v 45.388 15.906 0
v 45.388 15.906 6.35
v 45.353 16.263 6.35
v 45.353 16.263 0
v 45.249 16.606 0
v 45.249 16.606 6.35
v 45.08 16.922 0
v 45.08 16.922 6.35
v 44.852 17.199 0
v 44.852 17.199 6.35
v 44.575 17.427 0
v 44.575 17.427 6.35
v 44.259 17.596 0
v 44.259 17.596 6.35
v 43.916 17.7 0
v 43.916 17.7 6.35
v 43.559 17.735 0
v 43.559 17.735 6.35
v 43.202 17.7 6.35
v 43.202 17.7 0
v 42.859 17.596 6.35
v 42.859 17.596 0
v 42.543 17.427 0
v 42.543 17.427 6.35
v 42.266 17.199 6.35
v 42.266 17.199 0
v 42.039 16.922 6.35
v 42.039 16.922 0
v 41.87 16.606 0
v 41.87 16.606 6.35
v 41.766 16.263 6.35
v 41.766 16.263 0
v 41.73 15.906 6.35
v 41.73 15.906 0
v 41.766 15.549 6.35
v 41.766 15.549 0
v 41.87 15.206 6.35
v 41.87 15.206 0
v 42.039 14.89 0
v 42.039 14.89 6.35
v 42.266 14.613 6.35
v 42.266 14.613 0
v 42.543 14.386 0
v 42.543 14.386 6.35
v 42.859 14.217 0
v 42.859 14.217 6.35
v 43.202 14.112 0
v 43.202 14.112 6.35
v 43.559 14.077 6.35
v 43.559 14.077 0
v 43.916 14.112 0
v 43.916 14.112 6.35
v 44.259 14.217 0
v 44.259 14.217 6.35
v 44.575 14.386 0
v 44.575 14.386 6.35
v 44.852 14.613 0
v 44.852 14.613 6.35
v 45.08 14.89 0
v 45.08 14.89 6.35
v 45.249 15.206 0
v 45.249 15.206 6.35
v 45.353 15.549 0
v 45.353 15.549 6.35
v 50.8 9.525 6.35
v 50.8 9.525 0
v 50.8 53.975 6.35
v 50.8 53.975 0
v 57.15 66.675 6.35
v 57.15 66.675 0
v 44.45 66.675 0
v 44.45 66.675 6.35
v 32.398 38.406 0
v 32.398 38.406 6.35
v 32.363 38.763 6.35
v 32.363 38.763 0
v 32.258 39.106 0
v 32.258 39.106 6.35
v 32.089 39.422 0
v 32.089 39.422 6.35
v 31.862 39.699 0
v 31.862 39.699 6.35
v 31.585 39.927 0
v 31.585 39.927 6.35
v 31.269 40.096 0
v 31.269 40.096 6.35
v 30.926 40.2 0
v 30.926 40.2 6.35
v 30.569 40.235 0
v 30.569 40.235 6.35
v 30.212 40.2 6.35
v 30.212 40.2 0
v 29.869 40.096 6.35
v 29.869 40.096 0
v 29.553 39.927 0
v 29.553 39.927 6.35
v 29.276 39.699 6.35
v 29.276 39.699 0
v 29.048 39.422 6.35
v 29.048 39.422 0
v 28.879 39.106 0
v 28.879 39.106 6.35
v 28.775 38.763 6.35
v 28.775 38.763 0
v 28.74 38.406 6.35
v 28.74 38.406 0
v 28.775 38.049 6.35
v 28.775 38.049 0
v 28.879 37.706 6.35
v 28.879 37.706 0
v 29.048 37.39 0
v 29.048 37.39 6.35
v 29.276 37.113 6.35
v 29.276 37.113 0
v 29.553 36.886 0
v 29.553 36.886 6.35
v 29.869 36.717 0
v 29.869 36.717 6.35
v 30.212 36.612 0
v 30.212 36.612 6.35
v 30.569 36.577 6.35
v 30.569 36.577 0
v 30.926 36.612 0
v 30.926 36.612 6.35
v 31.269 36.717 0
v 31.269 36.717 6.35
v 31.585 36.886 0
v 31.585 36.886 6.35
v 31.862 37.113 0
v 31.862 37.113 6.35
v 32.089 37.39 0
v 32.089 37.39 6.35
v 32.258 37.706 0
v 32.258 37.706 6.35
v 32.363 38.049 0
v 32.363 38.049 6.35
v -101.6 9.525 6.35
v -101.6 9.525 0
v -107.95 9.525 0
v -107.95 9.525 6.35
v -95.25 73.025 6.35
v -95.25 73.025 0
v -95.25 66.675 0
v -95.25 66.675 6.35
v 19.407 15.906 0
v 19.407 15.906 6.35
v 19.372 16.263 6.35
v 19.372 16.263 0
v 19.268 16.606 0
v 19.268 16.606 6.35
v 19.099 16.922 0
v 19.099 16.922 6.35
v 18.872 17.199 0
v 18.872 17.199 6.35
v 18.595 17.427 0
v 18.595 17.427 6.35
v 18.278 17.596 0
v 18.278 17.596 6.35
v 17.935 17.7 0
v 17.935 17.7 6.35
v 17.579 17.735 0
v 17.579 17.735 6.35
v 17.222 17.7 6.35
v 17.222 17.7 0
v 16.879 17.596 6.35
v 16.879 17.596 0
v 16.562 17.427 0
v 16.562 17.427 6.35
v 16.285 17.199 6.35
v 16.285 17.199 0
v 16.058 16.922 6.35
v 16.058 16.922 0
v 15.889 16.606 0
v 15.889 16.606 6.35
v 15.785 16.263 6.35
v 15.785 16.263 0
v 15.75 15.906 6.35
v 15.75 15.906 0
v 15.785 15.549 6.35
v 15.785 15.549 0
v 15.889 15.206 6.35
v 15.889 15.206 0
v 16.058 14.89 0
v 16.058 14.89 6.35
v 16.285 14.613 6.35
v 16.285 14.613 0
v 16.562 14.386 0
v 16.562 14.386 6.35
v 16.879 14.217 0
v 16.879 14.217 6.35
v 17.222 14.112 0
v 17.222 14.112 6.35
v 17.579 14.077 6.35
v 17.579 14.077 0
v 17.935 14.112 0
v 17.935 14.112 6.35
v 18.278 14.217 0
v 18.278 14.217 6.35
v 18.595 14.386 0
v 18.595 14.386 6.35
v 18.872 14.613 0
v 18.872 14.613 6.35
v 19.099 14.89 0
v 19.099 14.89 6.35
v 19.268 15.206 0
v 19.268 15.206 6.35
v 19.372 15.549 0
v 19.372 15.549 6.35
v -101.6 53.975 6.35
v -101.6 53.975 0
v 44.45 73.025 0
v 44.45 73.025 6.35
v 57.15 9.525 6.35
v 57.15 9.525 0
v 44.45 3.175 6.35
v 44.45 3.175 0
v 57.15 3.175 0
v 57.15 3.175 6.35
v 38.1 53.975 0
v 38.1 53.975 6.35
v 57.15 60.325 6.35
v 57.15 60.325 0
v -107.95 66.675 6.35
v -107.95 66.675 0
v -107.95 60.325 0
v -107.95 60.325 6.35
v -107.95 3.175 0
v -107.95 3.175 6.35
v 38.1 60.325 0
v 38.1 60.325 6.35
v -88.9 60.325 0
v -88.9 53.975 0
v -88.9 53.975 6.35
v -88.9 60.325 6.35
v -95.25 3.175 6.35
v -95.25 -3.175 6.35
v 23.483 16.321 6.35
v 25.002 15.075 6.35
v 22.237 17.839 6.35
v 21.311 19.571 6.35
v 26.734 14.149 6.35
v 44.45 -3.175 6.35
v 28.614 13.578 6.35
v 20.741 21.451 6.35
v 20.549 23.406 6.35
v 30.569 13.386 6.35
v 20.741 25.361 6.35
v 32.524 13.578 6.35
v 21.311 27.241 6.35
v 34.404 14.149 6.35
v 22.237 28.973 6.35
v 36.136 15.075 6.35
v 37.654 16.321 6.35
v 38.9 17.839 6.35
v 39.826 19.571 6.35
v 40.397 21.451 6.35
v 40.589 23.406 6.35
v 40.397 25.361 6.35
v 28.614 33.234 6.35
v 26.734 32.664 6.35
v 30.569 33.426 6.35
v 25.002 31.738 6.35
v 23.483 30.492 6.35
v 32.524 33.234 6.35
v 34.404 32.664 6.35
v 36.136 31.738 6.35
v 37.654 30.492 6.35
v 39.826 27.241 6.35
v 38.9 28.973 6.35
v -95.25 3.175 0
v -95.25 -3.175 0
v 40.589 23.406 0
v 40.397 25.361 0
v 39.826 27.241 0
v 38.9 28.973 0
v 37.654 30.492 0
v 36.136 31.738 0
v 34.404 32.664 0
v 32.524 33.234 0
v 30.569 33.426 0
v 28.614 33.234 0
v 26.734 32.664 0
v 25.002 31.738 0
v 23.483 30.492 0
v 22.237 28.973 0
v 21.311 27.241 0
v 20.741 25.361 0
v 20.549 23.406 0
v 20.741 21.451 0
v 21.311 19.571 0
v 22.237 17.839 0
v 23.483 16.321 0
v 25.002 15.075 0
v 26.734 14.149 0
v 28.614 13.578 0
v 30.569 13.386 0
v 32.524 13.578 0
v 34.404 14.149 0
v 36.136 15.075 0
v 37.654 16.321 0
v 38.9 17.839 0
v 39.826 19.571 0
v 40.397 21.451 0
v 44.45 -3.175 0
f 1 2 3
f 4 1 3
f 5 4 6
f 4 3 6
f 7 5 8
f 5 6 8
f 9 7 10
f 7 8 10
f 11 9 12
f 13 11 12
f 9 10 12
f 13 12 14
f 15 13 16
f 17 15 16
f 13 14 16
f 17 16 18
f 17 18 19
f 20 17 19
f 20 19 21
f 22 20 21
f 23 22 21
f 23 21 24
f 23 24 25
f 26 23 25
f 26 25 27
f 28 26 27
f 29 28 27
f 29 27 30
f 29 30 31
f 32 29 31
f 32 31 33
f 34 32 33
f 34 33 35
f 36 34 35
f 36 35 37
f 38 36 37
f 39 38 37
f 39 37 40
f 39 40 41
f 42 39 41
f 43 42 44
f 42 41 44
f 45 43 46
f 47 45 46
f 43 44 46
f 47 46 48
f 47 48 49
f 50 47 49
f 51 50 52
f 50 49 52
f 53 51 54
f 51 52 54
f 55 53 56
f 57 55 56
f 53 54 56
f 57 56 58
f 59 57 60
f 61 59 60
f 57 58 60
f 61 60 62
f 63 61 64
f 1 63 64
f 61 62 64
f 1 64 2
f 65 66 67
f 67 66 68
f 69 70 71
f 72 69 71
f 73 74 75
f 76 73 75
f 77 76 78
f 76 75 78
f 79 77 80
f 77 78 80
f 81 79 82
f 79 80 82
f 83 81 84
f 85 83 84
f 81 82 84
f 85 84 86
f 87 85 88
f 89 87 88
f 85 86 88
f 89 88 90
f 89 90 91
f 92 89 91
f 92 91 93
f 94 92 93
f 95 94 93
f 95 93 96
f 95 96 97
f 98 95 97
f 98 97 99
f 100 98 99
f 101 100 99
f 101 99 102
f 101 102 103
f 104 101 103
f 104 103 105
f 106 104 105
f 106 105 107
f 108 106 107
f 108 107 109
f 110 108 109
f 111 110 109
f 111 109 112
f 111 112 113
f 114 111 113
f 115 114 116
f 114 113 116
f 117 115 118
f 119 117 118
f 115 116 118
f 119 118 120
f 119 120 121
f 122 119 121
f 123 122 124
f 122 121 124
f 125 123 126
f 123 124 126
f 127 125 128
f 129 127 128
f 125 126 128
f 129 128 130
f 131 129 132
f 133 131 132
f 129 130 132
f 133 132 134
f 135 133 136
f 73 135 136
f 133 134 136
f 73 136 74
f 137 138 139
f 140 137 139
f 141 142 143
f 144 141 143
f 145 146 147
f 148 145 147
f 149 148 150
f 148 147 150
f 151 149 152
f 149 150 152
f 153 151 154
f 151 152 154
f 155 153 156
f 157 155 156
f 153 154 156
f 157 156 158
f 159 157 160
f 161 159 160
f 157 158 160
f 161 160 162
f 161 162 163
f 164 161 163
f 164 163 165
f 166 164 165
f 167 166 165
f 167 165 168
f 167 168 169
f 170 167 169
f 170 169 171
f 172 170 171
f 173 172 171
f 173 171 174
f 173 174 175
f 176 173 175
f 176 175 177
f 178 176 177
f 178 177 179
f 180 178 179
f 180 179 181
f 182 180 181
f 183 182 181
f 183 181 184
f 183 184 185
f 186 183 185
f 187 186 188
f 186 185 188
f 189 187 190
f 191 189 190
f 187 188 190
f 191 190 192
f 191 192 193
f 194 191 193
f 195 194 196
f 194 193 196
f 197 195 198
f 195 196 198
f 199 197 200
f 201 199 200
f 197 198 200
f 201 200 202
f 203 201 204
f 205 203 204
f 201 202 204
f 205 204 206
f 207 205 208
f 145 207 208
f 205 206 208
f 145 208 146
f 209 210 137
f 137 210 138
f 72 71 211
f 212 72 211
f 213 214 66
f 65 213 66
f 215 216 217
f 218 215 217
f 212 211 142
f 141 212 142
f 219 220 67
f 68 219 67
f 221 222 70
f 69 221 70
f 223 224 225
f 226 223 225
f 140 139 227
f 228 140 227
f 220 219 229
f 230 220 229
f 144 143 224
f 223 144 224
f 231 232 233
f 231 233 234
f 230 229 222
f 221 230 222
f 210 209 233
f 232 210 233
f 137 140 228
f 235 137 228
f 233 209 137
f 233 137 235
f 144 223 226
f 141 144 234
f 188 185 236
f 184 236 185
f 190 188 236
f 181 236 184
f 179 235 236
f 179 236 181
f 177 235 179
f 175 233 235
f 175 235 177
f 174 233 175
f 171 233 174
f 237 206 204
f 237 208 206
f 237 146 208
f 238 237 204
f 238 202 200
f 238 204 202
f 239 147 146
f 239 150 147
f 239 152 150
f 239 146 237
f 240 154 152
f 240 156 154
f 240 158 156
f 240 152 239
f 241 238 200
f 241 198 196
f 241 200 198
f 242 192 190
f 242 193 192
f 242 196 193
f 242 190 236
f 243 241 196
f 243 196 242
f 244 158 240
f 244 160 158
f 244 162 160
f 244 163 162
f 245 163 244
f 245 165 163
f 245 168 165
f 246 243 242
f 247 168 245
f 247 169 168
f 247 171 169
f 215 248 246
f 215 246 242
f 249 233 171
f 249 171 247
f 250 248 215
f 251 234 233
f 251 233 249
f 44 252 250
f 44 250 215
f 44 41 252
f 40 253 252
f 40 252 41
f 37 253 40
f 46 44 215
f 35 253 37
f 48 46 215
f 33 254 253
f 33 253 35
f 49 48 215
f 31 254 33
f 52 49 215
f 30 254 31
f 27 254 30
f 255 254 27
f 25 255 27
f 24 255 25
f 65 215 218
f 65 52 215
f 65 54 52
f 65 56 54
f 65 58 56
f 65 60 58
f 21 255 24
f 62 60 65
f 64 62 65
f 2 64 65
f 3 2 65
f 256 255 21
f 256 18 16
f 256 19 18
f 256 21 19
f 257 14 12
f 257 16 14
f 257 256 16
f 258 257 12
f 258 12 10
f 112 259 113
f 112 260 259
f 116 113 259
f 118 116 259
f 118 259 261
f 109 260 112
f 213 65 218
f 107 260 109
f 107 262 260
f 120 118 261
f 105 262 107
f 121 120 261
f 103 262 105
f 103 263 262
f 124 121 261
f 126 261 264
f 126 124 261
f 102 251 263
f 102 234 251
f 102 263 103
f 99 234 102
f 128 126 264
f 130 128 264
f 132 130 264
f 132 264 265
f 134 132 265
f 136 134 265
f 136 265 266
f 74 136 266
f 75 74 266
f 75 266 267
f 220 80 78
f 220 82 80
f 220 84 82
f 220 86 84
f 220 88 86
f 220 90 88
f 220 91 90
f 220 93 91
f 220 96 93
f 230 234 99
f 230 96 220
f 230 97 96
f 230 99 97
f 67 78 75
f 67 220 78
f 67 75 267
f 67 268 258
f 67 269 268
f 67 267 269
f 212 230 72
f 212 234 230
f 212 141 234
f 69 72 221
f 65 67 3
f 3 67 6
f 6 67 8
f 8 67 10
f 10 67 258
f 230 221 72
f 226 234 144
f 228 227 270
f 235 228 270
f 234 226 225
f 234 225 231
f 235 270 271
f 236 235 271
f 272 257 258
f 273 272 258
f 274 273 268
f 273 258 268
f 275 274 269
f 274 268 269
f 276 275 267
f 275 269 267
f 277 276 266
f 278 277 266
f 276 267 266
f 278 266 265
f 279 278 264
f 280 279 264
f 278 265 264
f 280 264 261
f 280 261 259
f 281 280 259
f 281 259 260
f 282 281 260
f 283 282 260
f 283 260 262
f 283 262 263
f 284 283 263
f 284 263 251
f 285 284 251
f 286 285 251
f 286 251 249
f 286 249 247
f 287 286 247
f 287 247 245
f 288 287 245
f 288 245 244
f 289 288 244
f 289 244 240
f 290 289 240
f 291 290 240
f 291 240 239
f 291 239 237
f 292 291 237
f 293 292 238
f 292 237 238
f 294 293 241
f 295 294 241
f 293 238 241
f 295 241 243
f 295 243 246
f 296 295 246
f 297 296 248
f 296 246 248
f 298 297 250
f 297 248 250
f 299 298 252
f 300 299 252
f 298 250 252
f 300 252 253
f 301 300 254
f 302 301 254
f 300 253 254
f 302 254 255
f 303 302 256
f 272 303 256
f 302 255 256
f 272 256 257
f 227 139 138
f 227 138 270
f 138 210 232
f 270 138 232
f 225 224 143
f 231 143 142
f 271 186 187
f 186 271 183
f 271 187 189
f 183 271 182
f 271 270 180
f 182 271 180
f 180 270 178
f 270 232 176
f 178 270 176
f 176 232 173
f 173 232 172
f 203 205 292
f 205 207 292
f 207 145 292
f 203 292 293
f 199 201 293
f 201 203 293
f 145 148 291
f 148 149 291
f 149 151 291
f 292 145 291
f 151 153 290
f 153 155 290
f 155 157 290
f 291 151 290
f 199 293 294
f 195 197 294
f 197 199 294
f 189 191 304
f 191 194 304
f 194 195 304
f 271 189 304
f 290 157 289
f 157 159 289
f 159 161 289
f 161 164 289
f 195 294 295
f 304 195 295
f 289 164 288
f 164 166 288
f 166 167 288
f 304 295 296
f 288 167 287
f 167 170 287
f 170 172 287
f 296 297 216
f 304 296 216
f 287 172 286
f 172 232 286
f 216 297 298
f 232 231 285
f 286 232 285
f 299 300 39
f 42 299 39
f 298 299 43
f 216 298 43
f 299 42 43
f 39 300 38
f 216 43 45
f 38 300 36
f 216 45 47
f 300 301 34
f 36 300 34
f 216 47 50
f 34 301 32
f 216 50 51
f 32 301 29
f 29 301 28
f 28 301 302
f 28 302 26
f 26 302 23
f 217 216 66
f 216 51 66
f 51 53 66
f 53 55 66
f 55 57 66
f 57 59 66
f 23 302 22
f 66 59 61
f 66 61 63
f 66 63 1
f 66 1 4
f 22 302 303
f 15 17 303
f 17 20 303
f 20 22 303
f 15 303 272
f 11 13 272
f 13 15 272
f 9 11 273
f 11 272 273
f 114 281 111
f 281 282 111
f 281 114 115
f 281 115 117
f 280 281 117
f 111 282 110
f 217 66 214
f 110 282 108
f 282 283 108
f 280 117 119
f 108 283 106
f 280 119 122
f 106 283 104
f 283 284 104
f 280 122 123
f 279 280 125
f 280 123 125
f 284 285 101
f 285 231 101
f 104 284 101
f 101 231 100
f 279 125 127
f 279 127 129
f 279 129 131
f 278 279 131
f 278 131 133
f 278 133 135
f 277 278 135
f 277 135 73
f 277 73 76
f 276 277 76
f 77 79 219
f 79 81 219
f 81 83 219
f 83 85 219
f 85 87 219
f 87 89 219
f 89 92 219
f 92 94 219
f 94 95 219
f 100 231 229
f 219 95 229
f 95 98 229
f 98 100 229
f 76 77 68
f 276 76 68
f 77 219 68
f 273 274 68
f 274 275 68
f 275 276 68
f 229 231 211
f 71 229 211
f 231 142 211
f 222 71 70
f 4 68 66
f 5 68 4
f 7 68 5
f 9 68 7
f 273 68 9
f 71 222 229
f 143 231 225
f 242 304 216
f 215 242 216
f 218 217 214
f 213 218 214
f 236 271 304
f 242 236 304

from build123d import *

# Parameters (mm, degrees)
BOSS_EXTRUDE1_DEPTH = 6.35
SKETCH2_R           = 10.0203
SKETCH2_R_2         = 1.8288
SKETCH2_W           = 19.05
SKETCH2_H           = 6.35
CUT_EXTRUDE1_DEPTH  = 131.484388434


with BuildPart() as part:
    # Sketch1 → Boss-Extrude1 (new body)
    with BuildSketch(Plane.XY):
        Polygon((-95.25, -3.175), (44.45, -3.175), (44.45, 3.175), (57.15, 3.175), (57.15, 9.525), (50.8, 9.525), (50.8, 60.325), (57.15, 60.325), (57.15, 66.675), (44.45, 66.675), (44.45, 73.025), (-95.25, 73.025), (-95.25, 66.675), (-107.95, 66.675), (-107.95, 60.325), (-101.6, 60.325), (-101.6, 9.525), (-107.95, 9.525), (-107.95, 3.175), (-95.25, 3.175), align=None)
    extrude(amount=BOSS_EXTRUDE1_DEPTH)

    # Sketch2 → Cut-Extrude1 (cut, through all)
    with BuildSketch(Plane.XY.offset(6.35)):
        with Locations((30.5689, 23.4061)):
            Circle(SKETCH2_R)
        with Locations((30.5689, 38.4061)):
            Circle(SKETCH2_R_2)
        with Locations((17.578518943, 15.9061)):
            Circle(SKETCH2_R_2)
        with Locations((43.559281057, 15.9061)):
            Circle(SKETCH2_R_2)
        with Locations((47.625, 57.15)):
            Rectangle(SKETCH2_W, SKETCH2_H)
        with Locations((-98.425, 57.15)):
            Rectangle(SKETCH2_W, SKETCH2_H)
    extrude(amount=-CUT_EXTRUDE1_DEPTH, mode=Mode.SUBTRACT)


solid = part.part
